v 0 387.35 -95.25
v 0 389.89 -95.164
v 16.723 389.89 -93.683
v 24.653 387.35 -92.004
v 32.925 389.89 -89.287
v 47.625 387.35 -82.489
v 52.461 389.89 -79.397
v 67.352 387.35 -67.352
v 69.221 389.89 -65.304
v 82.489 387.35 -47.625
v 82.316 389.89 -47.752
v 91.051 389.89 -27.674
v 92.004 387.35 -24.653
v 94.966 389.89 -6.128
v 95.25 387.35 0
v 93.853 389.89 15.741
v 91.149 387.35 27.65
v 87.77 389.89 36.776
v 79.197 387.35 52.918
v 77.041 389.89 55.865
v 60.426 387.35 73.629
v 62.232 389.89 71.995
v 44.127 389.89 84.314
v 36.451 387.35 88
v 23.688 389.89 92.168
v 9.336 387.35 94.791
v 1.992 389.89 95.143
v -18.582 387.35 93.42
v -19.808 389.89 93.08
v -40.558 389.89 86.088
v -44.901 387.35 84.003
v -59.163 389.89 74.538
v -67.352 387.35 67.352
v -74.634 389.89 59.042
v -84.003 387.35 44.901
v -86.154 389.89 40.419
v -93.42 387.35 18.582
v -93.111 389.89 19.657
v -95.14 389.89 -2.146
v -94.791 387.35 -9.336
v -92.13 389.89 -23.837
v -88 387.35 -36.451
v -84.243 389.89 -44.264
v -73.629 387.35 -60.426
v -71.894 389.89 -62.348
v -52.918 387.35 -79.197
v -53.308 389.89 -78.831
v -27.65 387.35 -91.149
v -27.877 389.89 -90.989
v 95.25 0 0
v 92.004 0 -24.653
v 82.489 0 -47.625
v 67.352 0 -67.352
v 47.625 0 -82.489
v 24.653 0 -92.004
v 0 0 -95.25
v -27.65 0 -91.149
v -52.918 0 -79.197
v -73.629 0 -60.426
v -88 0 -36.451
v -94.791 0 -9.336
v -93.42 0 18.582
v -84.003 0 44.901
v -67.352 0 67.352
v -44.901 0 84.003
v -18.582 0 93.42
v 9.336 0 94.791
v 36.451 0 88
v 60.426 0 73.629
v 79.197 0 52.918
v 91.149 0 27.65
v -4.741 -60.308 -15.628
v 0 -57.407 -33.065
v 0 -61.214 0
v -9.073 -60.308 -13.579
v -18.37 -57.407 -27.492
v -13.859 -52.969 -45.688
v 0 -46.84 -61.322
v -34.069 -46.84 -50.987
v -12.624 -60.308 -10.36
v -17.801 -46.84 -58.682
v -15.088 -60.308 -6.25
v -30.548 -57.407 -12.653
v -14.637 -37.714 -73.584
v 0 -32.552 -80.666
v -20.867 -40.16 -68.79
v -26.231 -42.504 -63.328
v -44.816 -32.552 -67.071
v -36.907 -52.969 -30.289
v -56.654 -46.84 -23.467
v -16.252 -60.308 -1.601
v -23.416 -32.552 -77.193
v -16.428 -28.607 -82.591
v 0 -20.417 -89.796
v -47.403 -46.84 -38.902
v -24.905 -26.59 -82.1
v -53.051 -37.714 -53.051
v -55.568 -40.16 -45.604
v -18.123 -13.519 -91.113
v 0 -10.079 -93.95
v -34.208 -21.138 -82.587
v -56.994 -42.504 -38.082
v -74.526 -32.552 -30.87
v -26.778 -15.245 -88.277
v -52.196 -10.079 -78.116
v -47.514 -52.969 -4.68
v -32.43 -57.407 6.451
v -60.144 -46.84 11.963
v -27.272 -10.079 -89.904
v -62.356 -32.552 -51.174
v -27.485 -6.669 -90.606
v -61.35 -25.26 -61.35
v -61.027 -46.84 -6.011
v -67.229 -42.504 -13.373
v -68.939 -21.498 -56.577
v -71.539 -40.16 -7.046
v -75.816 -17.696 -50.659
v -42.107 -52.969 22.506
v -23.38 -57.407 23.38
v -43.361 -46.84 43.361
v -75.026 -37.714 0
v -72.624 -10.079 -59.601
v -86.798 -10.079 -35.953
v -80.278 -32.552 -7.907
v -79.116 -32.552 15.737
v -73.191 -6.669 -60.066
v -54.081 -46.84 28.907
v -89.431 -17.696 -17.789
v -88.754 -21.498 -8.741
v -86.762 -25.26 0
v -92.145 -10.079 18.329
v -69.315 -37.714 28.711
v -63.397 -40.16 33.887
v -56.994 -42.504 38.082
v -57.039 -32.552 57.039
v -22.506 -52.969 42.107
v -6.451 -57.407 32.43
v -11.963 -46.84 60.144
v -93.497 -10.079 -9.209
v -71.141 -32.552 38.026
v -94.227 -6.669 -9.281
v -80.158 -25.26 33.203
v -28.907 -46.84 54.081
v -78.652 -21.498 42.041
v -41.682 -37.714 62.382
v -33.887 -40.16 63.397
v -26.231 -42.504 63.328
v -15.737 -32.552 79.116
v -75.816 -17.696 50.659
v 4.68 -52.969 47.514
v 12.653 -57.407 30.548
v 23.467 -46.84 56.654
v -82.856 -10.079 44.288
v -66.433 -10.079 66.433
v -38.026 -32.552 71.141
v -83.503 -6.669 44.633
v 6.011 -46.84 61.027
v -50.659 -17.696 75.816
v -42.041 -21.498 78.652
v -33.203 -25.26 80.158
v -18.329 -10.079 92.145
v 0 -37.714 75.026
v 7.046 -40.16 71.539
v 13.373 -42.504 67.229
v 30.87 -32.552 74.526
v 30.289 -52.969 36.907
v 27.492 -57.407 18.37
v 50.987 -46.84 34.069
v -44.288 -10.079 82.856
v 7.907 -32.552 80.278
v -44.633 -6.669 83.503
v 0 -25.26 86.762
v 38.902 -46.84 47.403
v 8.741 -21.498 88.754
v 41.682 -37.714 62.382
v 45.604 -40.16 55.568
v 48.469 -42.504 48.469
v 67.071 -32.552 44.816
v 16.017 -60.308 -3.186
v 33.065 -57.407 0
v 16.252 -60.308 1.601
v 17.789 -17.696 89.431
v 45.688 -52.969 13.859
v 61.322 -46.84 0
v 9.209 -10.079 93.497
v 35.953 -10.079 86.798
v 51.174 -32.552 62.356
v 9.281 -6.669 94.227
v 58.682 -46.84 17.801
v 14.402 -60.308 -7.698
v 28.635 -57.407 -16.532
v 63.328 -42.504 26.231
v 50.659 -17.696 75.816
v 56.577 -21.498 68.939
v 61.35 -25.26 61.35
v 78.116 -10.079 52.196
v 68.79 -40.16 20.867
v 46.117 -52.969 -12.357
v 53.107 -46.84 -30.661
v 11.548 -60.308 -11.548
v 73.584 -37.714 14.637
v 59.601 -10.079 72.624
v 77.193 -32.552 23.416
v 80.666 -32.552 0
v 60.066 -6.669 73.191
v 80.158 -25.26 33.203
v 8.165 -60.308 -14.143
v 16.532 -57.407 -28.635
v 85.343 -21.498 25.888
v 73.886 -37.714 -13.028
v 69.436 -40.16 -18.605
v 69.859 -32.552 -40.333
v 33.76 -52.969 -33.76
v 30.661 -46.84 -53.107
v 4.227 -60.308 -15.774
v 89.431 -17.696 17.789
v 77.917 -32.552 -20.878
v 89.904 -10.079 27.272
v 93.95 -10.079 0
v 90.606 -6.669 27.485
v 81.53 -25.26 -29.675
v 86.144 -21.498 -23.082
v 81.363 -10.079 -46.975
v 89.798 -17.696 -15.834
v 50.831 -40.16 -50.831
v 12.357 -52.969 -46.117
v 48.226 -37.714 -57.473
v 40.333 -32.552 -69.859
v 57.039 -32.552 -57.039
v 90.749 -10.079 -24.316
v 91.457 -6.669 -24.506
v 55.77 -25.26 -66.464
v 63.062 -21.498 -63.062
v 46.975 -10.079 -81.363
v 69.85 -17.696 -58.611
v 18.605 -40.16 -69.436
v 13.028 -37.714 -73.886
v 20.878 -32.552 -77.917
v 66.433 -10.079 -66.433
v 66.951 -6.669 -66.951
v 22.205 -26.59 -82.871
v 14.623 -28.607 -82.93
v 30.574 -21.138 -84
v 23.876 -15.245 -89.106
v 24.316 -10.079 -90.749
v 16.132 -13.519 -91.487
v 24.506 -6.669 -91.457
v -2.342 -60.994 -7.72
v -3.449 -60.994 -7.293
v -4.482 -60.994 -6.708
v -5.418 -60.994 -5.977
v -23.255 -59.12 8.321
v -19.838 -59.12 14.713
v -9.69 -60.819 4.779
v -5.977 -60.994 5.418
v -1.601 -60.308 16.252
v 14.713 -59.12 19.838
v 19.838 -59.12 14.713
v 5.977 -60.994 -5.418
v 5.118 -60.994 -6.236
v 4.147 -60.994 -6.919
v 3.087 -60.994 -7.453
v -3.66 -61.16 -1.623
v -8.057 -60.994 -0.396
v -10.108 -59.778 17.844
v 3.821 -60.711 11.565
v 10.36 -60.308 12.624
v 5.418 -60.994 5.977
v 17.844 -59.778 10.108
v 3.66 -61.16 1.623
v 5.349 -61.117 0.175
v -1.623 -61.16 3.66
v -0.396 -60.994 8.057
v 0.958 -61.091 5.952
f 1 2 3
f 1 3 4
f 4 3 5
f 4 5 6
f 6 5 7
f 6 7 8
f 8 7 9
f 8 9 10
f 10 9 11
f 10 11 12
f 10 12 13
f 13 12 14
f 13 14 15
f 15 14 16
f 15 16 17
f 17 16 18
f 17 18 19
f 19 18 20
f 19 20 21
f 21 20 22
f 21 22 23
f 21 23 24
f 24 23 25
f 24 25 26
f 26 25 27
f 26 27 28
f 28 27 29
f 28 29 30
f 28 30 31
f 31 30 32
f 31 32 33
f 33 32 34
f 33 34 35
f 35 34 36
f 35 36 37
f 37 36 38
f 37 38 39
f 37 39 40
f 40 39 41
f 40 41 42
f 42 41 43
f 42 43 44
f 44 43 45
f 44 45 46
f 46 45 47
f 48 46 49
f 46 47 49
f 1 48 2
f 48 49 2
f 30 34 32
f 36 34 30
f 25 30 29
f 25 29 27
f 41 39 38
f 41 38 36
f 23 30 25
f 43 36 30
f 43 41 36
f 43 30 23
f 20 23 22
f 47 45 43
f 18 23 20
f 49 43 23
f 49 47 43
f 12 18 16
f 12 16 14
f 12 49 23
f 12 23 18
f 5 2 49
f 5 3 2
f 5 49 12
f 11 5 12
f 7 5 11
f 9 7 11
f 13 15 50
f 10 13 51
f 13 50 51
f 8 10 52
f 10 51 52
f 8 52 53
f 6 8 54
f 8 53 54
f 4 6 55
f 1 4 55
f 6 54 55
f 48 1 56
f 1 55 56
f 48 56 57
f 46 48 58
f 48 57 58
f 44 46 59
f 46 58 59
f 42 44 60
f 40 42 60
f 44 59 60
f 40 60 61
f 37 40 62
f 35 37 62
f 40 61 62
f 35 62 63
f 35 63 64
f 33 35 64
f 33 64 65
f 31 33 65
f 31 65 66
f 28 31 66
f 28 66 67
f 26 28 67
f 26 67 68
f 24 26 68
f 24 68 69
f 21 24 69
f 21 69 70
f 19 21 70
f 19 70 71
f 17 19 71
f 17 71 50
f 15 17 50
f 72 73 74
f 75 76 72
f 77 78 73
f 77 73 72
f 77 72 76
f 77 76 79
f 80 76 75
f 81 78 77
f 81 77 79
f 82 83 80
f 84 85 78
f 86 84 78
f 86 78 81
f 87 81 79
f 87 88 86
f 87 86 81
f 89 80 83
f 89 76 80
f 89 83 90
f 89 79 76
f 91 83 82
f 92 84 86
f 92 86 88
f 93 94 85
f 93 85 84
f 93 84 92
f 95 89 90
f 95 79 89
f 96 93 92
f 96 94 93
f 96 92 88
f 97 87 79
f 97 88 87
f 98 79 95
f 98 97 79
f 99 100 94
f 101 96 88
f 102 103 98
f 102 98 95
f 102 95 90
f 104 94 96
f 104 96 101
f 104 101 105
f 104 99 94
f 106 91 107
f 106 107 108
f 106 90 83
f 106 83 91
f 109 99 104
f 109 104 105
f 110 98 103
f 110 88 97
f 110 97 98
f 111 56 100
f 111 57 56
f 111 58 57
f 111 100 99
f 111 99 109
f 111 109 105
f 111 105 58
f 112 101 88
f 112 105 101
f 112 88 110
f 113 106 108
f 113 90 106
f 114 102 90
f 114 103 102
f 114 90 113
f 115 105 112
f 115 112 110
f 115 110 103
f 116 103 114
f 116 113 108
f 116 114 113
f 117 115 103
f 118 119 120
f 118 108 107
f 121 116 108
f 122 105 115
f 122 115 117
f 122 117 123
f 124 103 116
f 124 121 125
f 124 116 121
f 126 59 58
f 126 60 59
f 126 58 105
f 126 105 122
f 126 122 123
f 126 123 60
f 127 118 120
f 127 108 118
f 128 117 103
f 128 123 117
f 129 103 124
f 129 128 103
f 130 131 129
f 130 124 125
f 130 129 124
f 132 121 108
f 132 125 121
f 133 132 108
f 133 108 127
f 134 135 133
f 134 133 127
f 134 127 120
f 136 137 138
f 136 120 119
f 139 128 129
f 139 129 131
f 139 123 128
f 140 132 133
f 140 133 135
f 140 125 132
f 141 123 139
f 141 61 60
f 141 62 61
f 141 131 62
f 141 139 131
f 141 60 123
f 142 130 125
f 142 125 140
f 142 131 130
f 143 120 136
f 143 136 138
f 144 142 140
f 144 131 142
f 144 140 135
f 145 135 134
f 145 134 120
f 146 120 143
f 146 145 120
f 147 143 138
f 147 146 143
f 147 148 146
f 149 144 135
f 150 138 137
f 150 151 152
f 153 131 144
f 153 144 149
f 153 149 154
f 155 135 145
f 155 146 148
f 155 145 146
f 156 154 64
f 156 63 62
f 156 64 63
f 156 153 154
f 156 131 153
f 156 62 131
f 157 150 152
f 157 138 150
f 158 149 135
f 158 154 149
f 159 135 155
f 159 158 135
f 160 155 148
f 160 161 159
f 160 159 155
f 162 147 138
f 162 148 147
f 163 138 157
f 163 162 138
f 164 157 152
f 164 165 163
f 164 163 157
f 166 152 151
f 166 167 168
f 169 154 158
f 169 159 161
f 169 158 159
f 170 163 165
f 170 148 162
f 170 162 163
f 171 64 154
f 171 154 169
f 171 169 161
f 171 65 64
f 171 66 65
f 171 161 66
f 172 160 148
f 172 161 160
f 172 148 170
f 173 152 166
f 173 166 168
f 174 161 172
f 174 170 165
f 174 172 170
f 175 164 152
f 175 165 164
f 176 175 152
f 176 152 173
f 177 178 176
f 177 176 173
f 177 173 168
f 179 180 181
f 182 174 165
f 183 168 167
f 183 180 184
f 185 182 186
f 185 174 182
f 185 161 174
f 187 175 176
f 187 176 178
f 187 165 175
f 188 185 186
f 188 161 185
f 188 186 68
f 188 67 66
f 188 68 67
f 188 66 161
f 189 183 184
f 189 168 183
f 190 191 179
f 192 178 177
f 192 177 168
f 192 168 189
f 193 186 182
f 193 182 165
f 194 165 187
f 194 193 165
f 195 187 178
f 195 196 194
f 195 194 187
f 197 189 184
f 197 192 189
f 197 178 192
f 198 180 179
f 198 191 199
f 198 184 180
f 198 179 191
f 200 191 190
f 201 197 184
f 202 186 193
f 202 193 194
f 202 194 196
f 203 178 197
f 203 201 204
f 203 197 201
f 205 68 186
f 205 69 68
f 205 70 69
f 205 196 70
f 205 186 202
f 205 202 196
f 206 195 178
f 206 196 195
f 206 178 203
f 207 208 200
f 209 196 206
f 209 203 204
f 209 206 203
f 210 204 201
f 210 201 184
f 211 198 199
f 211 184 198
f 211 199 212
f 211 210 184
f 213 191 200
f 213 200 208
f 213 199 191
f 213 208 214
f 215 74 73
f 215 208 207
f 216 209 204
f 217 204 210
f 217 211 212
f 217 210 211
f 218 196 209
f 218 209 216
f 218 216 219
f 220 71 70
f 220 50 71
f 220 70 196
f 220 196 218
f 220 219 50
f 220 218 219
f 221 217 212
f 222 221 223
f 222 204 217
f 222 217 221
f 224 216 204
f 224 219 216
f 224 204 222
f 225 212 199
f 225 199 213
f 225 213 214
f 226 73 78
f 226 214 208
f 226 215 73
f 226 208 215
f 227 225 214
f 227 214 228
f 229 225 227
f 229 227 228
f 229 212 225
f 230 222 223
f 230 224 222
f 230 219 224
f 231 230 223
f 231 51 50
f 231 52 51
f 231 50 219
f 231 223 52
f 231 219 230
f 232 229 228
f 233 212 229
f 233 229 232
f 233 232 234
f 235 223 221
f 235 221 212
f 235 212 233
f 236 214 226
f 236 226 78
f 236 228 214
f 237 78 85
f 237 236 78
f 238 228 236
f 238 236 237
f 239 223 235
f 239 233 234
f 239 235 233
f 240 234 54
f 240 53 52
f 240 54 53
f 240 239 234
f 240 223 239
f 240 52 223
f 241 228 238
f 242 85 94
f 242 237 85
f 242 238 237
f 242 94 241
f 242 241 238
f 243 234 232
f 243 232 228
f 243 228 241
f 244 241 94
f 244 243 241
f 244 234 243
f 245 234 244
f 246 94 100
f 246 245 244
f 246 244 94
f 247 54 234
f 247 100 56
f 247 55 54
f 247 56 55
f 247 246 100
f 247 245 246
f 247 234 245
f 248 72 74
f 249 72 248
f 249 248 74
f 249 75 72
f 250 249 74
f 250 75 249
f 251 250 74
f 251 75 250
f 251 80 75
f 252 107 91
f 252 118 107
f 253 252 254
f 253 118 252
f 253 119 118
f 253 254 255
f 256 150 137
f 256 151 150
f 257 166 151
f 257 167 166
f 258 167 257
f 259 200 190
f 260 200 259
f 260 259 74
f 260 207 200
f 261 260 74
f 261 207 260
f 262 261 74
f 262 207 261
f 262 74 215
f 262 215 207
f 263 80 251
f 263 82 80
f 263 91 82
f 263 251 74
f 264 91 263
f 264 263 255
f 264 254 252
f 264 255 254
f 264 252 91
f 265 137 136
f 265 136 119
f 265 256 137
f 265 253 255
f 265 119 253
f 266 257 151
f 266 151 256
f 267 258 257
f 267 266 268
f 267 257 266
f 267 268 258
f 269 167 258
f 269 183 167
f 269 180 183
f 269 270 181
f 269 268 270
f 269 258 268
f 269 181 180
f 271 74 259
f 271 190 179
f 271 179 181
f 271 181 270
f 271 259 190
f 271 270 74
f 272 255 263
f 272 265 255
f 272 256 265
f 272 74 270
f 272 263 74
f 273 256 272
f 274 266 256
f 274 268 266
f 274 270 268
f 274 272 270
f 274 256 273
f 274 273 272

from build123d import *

# Parameters (mm, degrees)
SKETCH2_R                = 95.25
BOSS_EXTRUDE1_DEPTH      = 387.35
SKETCH6_R                = 95.25
F_7_PERCENT_ULLAGE_DEPTH = 57.15


with BuildPart() as part:
    # Sketch2 → Boss-Extrude1 (new body)
    with BuildSketch(Plane(origin=(0, 0, 0), x_dir=(1, 0, 0), z_dir=(0, 1, 0))):
        Circle(SKETCH2_R)
    extrude(amount=BOSS_EXTRUDE1_DEPTH)

    # Sketch3 → Revolve2 (revolve)
    with BuildSketch(Plane(origin=(0, 0, 0), x_dir=(0, 0, -1), z_dir=(1, 0, 0))):
        with BuildLine():
            Line((0, 447.04), (0, 387.35))
            Line((0, 387.35), (95.25, 387.35))
            add(Edge.make_bspline(
                [(95.25, 387.35), (95.25, 447.04), (0, 447.04)],
                knots=[3.141592654, 3.141592654, 3.141592654, 4.71238898, 4.71238898, 4.71238898], degree=2, weights=[1, 0.707106781, 1]))
        make_face()
    revolve(axis=Axis((0, 447.04, 0), (0, -1, 0)))

    # Sketch4 → Revolve3 (revolve)
    with BuildSketch(Plane(origin=(0, 0, 0), x_dir=(0, 0, -1), z_dir=(1, 0, 0))):
        with BuildLine():
            Line((0, -61.214), (0, 0))
            Line((0, 0), (95.25, 0))
            add(Edge.make_bspline(
                [(0, -61.214), (95.25, -61.214), (95.25, 0)],
                knots=[4.71238898, 4.71238898, 4.71238898, 6.283185307, 6.283185307, 6.283185307], degree=2, weights=[1, 0.707106781, 1]))
        make_face()
    revolve(axis=Axis((0, -61.214, 0), (0, 1, 0)))

    # Sketch6 → 7 Percent Ullage (cut)
    with BuildSketch(Plane(origin=(0, 447.04, 0), x_dir=(1, 0, 0), z_dir=(0, 1, 0))):
        Circle(SKETCH6_R)
    extrude(amount=-F_7_PERCENT_ULLAGE_DEPTH, mode=Mode.SUBTRACT)


solid = part.part
